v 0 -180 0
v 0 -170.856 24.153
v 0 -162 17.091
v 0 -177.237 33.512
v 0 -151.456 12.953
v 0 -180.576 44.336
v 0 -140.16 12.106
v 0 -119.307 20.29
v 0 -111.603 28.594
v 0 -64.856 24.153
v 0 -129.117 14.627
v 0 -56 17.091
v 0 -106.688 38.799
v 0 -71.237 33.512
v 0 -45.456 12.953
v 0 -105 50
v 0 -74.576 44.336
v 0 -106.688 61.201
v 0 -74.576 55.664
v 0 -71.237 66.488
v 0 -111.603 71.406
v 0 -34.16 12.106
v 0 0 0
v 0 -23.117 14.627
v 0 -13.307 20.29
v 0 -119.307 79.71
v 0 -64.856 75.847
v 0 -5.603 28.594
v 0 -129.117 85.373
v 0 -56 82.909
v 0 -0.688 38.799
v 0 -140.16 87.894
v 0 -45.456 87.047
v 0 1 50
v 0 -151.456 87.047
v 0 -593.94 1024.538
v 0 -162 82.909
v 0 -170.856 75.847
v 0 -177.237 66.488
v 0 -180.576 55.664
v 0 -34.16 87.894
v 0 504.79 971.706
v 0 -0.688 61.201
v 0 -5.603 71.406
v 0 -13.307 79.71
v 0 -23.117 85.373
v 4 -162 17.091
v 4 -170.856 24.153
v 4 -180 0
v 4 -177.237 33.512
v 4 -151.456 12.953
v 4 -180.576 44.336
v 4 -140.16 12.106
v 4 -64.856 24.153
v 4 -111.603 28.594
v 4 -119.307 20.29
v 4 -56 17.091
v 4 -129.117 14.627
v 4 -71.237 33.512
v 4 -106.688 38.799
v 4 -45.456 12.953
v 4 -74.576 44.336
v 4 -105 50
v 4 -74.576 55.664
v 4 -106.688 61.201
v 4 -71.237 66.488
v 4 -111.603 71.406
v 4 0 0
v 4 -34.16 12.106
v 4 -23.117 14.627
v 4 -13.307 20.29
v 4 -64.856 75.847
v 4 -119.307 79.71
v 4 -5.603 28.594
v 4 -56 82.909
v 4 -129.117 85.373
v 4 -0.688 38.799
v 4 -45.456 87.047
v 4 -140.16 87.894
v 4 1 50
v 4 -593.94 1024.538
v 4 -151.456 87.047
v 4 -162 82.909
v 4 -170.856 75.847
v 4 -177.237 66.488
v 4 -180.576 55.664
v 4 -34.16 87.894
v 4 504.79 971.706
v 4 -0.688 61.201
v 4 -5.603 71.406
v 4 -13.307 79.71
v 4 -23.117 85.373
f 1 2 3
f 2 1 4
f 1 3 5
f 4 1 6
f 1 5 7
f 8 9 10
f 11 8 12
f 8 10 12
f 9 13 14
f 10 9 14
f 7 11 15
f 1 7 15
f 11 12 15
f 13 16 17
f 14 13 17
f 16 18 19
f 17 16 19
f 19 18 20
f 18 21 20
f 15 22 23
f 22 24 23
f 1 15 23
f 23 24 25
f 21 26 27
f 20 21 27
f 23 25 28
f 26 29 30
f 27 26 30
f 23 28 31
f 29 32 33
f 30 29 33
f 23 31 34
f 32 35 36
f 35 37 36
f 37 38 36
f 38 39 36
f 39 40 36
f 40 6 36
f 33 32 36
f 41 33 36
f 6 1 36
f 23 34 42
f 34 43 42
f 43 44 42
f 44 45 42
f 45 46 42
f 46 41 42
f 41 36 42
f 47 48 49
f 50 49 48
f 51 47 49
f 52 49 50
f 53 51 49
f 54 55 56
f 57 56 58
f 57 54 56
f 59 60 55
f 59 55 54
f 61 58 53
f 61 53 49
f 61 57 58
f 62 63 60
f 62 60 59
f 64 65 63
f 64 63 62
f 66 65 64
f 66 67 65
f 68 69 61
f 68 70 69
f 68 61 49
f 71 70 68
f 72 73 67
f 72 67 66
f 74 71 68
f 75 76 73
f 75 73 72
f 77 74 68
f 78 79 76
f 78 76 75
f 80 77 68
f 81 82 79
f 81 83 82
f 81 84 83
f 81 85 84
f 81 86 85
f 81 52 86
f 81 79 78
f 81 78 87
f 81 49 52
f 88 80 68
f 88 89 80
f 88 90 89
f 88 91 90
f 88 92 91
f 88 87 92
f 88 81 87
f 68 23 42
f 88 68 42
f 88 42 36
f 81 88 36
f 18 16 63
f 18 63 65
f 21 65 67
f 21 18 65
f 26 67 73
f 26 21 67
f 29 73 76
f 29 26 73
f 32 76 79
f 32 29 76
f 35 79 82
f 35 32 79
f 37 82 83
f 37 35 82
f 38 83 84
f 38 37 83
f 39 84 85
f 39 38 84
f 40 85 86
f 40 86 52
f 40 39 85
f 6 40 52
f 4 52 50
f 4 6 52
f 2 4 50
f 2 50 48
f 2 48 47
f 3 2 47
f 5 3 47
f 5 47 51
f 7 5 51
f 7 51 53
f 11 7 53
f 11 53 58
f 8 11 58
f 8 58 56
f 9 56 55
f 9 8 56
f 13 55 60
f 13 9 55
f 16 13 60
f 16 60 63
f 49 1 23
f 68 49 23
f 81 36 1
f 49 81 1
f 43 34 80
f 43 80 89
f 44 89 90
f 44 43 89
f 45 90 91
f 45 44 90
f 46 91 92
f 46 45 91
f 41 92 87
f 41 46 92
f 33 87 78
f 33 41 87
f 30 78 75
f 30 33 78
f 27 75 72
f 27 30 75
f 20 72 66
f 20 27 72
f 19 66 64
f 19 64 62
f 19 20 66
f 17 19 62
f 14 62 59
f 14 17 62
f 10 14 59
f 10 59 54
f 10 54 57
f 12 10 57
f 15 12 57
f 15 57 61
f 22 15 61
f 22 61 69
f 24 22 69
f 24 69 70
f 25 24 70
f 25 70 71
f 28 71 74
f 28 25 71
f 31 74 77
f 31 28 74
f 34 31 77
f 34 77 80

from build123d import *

# Parameters (mm, degrees)
F0_R     = 38
F1_DEPTH = 4


with BuildPart() as f1:
    # F0 (on Right) → F1 (new body)
    with BuildSketch(Plane.YZ):
        Polygon((-180, 0), (0, 0), (504.79022, 971.705631), (-593.940286, 1024.538159), align=None)
        with Locations((-143, 50)):
            Circle(F0_R, mode=Mode.SUBTRACT)
        with Locations((-37, 50)):
            Circle(F0_R, mode=Mode.SUBTRACT)
    extrude(amount=F1_DEPTH)


solid = f1.part
